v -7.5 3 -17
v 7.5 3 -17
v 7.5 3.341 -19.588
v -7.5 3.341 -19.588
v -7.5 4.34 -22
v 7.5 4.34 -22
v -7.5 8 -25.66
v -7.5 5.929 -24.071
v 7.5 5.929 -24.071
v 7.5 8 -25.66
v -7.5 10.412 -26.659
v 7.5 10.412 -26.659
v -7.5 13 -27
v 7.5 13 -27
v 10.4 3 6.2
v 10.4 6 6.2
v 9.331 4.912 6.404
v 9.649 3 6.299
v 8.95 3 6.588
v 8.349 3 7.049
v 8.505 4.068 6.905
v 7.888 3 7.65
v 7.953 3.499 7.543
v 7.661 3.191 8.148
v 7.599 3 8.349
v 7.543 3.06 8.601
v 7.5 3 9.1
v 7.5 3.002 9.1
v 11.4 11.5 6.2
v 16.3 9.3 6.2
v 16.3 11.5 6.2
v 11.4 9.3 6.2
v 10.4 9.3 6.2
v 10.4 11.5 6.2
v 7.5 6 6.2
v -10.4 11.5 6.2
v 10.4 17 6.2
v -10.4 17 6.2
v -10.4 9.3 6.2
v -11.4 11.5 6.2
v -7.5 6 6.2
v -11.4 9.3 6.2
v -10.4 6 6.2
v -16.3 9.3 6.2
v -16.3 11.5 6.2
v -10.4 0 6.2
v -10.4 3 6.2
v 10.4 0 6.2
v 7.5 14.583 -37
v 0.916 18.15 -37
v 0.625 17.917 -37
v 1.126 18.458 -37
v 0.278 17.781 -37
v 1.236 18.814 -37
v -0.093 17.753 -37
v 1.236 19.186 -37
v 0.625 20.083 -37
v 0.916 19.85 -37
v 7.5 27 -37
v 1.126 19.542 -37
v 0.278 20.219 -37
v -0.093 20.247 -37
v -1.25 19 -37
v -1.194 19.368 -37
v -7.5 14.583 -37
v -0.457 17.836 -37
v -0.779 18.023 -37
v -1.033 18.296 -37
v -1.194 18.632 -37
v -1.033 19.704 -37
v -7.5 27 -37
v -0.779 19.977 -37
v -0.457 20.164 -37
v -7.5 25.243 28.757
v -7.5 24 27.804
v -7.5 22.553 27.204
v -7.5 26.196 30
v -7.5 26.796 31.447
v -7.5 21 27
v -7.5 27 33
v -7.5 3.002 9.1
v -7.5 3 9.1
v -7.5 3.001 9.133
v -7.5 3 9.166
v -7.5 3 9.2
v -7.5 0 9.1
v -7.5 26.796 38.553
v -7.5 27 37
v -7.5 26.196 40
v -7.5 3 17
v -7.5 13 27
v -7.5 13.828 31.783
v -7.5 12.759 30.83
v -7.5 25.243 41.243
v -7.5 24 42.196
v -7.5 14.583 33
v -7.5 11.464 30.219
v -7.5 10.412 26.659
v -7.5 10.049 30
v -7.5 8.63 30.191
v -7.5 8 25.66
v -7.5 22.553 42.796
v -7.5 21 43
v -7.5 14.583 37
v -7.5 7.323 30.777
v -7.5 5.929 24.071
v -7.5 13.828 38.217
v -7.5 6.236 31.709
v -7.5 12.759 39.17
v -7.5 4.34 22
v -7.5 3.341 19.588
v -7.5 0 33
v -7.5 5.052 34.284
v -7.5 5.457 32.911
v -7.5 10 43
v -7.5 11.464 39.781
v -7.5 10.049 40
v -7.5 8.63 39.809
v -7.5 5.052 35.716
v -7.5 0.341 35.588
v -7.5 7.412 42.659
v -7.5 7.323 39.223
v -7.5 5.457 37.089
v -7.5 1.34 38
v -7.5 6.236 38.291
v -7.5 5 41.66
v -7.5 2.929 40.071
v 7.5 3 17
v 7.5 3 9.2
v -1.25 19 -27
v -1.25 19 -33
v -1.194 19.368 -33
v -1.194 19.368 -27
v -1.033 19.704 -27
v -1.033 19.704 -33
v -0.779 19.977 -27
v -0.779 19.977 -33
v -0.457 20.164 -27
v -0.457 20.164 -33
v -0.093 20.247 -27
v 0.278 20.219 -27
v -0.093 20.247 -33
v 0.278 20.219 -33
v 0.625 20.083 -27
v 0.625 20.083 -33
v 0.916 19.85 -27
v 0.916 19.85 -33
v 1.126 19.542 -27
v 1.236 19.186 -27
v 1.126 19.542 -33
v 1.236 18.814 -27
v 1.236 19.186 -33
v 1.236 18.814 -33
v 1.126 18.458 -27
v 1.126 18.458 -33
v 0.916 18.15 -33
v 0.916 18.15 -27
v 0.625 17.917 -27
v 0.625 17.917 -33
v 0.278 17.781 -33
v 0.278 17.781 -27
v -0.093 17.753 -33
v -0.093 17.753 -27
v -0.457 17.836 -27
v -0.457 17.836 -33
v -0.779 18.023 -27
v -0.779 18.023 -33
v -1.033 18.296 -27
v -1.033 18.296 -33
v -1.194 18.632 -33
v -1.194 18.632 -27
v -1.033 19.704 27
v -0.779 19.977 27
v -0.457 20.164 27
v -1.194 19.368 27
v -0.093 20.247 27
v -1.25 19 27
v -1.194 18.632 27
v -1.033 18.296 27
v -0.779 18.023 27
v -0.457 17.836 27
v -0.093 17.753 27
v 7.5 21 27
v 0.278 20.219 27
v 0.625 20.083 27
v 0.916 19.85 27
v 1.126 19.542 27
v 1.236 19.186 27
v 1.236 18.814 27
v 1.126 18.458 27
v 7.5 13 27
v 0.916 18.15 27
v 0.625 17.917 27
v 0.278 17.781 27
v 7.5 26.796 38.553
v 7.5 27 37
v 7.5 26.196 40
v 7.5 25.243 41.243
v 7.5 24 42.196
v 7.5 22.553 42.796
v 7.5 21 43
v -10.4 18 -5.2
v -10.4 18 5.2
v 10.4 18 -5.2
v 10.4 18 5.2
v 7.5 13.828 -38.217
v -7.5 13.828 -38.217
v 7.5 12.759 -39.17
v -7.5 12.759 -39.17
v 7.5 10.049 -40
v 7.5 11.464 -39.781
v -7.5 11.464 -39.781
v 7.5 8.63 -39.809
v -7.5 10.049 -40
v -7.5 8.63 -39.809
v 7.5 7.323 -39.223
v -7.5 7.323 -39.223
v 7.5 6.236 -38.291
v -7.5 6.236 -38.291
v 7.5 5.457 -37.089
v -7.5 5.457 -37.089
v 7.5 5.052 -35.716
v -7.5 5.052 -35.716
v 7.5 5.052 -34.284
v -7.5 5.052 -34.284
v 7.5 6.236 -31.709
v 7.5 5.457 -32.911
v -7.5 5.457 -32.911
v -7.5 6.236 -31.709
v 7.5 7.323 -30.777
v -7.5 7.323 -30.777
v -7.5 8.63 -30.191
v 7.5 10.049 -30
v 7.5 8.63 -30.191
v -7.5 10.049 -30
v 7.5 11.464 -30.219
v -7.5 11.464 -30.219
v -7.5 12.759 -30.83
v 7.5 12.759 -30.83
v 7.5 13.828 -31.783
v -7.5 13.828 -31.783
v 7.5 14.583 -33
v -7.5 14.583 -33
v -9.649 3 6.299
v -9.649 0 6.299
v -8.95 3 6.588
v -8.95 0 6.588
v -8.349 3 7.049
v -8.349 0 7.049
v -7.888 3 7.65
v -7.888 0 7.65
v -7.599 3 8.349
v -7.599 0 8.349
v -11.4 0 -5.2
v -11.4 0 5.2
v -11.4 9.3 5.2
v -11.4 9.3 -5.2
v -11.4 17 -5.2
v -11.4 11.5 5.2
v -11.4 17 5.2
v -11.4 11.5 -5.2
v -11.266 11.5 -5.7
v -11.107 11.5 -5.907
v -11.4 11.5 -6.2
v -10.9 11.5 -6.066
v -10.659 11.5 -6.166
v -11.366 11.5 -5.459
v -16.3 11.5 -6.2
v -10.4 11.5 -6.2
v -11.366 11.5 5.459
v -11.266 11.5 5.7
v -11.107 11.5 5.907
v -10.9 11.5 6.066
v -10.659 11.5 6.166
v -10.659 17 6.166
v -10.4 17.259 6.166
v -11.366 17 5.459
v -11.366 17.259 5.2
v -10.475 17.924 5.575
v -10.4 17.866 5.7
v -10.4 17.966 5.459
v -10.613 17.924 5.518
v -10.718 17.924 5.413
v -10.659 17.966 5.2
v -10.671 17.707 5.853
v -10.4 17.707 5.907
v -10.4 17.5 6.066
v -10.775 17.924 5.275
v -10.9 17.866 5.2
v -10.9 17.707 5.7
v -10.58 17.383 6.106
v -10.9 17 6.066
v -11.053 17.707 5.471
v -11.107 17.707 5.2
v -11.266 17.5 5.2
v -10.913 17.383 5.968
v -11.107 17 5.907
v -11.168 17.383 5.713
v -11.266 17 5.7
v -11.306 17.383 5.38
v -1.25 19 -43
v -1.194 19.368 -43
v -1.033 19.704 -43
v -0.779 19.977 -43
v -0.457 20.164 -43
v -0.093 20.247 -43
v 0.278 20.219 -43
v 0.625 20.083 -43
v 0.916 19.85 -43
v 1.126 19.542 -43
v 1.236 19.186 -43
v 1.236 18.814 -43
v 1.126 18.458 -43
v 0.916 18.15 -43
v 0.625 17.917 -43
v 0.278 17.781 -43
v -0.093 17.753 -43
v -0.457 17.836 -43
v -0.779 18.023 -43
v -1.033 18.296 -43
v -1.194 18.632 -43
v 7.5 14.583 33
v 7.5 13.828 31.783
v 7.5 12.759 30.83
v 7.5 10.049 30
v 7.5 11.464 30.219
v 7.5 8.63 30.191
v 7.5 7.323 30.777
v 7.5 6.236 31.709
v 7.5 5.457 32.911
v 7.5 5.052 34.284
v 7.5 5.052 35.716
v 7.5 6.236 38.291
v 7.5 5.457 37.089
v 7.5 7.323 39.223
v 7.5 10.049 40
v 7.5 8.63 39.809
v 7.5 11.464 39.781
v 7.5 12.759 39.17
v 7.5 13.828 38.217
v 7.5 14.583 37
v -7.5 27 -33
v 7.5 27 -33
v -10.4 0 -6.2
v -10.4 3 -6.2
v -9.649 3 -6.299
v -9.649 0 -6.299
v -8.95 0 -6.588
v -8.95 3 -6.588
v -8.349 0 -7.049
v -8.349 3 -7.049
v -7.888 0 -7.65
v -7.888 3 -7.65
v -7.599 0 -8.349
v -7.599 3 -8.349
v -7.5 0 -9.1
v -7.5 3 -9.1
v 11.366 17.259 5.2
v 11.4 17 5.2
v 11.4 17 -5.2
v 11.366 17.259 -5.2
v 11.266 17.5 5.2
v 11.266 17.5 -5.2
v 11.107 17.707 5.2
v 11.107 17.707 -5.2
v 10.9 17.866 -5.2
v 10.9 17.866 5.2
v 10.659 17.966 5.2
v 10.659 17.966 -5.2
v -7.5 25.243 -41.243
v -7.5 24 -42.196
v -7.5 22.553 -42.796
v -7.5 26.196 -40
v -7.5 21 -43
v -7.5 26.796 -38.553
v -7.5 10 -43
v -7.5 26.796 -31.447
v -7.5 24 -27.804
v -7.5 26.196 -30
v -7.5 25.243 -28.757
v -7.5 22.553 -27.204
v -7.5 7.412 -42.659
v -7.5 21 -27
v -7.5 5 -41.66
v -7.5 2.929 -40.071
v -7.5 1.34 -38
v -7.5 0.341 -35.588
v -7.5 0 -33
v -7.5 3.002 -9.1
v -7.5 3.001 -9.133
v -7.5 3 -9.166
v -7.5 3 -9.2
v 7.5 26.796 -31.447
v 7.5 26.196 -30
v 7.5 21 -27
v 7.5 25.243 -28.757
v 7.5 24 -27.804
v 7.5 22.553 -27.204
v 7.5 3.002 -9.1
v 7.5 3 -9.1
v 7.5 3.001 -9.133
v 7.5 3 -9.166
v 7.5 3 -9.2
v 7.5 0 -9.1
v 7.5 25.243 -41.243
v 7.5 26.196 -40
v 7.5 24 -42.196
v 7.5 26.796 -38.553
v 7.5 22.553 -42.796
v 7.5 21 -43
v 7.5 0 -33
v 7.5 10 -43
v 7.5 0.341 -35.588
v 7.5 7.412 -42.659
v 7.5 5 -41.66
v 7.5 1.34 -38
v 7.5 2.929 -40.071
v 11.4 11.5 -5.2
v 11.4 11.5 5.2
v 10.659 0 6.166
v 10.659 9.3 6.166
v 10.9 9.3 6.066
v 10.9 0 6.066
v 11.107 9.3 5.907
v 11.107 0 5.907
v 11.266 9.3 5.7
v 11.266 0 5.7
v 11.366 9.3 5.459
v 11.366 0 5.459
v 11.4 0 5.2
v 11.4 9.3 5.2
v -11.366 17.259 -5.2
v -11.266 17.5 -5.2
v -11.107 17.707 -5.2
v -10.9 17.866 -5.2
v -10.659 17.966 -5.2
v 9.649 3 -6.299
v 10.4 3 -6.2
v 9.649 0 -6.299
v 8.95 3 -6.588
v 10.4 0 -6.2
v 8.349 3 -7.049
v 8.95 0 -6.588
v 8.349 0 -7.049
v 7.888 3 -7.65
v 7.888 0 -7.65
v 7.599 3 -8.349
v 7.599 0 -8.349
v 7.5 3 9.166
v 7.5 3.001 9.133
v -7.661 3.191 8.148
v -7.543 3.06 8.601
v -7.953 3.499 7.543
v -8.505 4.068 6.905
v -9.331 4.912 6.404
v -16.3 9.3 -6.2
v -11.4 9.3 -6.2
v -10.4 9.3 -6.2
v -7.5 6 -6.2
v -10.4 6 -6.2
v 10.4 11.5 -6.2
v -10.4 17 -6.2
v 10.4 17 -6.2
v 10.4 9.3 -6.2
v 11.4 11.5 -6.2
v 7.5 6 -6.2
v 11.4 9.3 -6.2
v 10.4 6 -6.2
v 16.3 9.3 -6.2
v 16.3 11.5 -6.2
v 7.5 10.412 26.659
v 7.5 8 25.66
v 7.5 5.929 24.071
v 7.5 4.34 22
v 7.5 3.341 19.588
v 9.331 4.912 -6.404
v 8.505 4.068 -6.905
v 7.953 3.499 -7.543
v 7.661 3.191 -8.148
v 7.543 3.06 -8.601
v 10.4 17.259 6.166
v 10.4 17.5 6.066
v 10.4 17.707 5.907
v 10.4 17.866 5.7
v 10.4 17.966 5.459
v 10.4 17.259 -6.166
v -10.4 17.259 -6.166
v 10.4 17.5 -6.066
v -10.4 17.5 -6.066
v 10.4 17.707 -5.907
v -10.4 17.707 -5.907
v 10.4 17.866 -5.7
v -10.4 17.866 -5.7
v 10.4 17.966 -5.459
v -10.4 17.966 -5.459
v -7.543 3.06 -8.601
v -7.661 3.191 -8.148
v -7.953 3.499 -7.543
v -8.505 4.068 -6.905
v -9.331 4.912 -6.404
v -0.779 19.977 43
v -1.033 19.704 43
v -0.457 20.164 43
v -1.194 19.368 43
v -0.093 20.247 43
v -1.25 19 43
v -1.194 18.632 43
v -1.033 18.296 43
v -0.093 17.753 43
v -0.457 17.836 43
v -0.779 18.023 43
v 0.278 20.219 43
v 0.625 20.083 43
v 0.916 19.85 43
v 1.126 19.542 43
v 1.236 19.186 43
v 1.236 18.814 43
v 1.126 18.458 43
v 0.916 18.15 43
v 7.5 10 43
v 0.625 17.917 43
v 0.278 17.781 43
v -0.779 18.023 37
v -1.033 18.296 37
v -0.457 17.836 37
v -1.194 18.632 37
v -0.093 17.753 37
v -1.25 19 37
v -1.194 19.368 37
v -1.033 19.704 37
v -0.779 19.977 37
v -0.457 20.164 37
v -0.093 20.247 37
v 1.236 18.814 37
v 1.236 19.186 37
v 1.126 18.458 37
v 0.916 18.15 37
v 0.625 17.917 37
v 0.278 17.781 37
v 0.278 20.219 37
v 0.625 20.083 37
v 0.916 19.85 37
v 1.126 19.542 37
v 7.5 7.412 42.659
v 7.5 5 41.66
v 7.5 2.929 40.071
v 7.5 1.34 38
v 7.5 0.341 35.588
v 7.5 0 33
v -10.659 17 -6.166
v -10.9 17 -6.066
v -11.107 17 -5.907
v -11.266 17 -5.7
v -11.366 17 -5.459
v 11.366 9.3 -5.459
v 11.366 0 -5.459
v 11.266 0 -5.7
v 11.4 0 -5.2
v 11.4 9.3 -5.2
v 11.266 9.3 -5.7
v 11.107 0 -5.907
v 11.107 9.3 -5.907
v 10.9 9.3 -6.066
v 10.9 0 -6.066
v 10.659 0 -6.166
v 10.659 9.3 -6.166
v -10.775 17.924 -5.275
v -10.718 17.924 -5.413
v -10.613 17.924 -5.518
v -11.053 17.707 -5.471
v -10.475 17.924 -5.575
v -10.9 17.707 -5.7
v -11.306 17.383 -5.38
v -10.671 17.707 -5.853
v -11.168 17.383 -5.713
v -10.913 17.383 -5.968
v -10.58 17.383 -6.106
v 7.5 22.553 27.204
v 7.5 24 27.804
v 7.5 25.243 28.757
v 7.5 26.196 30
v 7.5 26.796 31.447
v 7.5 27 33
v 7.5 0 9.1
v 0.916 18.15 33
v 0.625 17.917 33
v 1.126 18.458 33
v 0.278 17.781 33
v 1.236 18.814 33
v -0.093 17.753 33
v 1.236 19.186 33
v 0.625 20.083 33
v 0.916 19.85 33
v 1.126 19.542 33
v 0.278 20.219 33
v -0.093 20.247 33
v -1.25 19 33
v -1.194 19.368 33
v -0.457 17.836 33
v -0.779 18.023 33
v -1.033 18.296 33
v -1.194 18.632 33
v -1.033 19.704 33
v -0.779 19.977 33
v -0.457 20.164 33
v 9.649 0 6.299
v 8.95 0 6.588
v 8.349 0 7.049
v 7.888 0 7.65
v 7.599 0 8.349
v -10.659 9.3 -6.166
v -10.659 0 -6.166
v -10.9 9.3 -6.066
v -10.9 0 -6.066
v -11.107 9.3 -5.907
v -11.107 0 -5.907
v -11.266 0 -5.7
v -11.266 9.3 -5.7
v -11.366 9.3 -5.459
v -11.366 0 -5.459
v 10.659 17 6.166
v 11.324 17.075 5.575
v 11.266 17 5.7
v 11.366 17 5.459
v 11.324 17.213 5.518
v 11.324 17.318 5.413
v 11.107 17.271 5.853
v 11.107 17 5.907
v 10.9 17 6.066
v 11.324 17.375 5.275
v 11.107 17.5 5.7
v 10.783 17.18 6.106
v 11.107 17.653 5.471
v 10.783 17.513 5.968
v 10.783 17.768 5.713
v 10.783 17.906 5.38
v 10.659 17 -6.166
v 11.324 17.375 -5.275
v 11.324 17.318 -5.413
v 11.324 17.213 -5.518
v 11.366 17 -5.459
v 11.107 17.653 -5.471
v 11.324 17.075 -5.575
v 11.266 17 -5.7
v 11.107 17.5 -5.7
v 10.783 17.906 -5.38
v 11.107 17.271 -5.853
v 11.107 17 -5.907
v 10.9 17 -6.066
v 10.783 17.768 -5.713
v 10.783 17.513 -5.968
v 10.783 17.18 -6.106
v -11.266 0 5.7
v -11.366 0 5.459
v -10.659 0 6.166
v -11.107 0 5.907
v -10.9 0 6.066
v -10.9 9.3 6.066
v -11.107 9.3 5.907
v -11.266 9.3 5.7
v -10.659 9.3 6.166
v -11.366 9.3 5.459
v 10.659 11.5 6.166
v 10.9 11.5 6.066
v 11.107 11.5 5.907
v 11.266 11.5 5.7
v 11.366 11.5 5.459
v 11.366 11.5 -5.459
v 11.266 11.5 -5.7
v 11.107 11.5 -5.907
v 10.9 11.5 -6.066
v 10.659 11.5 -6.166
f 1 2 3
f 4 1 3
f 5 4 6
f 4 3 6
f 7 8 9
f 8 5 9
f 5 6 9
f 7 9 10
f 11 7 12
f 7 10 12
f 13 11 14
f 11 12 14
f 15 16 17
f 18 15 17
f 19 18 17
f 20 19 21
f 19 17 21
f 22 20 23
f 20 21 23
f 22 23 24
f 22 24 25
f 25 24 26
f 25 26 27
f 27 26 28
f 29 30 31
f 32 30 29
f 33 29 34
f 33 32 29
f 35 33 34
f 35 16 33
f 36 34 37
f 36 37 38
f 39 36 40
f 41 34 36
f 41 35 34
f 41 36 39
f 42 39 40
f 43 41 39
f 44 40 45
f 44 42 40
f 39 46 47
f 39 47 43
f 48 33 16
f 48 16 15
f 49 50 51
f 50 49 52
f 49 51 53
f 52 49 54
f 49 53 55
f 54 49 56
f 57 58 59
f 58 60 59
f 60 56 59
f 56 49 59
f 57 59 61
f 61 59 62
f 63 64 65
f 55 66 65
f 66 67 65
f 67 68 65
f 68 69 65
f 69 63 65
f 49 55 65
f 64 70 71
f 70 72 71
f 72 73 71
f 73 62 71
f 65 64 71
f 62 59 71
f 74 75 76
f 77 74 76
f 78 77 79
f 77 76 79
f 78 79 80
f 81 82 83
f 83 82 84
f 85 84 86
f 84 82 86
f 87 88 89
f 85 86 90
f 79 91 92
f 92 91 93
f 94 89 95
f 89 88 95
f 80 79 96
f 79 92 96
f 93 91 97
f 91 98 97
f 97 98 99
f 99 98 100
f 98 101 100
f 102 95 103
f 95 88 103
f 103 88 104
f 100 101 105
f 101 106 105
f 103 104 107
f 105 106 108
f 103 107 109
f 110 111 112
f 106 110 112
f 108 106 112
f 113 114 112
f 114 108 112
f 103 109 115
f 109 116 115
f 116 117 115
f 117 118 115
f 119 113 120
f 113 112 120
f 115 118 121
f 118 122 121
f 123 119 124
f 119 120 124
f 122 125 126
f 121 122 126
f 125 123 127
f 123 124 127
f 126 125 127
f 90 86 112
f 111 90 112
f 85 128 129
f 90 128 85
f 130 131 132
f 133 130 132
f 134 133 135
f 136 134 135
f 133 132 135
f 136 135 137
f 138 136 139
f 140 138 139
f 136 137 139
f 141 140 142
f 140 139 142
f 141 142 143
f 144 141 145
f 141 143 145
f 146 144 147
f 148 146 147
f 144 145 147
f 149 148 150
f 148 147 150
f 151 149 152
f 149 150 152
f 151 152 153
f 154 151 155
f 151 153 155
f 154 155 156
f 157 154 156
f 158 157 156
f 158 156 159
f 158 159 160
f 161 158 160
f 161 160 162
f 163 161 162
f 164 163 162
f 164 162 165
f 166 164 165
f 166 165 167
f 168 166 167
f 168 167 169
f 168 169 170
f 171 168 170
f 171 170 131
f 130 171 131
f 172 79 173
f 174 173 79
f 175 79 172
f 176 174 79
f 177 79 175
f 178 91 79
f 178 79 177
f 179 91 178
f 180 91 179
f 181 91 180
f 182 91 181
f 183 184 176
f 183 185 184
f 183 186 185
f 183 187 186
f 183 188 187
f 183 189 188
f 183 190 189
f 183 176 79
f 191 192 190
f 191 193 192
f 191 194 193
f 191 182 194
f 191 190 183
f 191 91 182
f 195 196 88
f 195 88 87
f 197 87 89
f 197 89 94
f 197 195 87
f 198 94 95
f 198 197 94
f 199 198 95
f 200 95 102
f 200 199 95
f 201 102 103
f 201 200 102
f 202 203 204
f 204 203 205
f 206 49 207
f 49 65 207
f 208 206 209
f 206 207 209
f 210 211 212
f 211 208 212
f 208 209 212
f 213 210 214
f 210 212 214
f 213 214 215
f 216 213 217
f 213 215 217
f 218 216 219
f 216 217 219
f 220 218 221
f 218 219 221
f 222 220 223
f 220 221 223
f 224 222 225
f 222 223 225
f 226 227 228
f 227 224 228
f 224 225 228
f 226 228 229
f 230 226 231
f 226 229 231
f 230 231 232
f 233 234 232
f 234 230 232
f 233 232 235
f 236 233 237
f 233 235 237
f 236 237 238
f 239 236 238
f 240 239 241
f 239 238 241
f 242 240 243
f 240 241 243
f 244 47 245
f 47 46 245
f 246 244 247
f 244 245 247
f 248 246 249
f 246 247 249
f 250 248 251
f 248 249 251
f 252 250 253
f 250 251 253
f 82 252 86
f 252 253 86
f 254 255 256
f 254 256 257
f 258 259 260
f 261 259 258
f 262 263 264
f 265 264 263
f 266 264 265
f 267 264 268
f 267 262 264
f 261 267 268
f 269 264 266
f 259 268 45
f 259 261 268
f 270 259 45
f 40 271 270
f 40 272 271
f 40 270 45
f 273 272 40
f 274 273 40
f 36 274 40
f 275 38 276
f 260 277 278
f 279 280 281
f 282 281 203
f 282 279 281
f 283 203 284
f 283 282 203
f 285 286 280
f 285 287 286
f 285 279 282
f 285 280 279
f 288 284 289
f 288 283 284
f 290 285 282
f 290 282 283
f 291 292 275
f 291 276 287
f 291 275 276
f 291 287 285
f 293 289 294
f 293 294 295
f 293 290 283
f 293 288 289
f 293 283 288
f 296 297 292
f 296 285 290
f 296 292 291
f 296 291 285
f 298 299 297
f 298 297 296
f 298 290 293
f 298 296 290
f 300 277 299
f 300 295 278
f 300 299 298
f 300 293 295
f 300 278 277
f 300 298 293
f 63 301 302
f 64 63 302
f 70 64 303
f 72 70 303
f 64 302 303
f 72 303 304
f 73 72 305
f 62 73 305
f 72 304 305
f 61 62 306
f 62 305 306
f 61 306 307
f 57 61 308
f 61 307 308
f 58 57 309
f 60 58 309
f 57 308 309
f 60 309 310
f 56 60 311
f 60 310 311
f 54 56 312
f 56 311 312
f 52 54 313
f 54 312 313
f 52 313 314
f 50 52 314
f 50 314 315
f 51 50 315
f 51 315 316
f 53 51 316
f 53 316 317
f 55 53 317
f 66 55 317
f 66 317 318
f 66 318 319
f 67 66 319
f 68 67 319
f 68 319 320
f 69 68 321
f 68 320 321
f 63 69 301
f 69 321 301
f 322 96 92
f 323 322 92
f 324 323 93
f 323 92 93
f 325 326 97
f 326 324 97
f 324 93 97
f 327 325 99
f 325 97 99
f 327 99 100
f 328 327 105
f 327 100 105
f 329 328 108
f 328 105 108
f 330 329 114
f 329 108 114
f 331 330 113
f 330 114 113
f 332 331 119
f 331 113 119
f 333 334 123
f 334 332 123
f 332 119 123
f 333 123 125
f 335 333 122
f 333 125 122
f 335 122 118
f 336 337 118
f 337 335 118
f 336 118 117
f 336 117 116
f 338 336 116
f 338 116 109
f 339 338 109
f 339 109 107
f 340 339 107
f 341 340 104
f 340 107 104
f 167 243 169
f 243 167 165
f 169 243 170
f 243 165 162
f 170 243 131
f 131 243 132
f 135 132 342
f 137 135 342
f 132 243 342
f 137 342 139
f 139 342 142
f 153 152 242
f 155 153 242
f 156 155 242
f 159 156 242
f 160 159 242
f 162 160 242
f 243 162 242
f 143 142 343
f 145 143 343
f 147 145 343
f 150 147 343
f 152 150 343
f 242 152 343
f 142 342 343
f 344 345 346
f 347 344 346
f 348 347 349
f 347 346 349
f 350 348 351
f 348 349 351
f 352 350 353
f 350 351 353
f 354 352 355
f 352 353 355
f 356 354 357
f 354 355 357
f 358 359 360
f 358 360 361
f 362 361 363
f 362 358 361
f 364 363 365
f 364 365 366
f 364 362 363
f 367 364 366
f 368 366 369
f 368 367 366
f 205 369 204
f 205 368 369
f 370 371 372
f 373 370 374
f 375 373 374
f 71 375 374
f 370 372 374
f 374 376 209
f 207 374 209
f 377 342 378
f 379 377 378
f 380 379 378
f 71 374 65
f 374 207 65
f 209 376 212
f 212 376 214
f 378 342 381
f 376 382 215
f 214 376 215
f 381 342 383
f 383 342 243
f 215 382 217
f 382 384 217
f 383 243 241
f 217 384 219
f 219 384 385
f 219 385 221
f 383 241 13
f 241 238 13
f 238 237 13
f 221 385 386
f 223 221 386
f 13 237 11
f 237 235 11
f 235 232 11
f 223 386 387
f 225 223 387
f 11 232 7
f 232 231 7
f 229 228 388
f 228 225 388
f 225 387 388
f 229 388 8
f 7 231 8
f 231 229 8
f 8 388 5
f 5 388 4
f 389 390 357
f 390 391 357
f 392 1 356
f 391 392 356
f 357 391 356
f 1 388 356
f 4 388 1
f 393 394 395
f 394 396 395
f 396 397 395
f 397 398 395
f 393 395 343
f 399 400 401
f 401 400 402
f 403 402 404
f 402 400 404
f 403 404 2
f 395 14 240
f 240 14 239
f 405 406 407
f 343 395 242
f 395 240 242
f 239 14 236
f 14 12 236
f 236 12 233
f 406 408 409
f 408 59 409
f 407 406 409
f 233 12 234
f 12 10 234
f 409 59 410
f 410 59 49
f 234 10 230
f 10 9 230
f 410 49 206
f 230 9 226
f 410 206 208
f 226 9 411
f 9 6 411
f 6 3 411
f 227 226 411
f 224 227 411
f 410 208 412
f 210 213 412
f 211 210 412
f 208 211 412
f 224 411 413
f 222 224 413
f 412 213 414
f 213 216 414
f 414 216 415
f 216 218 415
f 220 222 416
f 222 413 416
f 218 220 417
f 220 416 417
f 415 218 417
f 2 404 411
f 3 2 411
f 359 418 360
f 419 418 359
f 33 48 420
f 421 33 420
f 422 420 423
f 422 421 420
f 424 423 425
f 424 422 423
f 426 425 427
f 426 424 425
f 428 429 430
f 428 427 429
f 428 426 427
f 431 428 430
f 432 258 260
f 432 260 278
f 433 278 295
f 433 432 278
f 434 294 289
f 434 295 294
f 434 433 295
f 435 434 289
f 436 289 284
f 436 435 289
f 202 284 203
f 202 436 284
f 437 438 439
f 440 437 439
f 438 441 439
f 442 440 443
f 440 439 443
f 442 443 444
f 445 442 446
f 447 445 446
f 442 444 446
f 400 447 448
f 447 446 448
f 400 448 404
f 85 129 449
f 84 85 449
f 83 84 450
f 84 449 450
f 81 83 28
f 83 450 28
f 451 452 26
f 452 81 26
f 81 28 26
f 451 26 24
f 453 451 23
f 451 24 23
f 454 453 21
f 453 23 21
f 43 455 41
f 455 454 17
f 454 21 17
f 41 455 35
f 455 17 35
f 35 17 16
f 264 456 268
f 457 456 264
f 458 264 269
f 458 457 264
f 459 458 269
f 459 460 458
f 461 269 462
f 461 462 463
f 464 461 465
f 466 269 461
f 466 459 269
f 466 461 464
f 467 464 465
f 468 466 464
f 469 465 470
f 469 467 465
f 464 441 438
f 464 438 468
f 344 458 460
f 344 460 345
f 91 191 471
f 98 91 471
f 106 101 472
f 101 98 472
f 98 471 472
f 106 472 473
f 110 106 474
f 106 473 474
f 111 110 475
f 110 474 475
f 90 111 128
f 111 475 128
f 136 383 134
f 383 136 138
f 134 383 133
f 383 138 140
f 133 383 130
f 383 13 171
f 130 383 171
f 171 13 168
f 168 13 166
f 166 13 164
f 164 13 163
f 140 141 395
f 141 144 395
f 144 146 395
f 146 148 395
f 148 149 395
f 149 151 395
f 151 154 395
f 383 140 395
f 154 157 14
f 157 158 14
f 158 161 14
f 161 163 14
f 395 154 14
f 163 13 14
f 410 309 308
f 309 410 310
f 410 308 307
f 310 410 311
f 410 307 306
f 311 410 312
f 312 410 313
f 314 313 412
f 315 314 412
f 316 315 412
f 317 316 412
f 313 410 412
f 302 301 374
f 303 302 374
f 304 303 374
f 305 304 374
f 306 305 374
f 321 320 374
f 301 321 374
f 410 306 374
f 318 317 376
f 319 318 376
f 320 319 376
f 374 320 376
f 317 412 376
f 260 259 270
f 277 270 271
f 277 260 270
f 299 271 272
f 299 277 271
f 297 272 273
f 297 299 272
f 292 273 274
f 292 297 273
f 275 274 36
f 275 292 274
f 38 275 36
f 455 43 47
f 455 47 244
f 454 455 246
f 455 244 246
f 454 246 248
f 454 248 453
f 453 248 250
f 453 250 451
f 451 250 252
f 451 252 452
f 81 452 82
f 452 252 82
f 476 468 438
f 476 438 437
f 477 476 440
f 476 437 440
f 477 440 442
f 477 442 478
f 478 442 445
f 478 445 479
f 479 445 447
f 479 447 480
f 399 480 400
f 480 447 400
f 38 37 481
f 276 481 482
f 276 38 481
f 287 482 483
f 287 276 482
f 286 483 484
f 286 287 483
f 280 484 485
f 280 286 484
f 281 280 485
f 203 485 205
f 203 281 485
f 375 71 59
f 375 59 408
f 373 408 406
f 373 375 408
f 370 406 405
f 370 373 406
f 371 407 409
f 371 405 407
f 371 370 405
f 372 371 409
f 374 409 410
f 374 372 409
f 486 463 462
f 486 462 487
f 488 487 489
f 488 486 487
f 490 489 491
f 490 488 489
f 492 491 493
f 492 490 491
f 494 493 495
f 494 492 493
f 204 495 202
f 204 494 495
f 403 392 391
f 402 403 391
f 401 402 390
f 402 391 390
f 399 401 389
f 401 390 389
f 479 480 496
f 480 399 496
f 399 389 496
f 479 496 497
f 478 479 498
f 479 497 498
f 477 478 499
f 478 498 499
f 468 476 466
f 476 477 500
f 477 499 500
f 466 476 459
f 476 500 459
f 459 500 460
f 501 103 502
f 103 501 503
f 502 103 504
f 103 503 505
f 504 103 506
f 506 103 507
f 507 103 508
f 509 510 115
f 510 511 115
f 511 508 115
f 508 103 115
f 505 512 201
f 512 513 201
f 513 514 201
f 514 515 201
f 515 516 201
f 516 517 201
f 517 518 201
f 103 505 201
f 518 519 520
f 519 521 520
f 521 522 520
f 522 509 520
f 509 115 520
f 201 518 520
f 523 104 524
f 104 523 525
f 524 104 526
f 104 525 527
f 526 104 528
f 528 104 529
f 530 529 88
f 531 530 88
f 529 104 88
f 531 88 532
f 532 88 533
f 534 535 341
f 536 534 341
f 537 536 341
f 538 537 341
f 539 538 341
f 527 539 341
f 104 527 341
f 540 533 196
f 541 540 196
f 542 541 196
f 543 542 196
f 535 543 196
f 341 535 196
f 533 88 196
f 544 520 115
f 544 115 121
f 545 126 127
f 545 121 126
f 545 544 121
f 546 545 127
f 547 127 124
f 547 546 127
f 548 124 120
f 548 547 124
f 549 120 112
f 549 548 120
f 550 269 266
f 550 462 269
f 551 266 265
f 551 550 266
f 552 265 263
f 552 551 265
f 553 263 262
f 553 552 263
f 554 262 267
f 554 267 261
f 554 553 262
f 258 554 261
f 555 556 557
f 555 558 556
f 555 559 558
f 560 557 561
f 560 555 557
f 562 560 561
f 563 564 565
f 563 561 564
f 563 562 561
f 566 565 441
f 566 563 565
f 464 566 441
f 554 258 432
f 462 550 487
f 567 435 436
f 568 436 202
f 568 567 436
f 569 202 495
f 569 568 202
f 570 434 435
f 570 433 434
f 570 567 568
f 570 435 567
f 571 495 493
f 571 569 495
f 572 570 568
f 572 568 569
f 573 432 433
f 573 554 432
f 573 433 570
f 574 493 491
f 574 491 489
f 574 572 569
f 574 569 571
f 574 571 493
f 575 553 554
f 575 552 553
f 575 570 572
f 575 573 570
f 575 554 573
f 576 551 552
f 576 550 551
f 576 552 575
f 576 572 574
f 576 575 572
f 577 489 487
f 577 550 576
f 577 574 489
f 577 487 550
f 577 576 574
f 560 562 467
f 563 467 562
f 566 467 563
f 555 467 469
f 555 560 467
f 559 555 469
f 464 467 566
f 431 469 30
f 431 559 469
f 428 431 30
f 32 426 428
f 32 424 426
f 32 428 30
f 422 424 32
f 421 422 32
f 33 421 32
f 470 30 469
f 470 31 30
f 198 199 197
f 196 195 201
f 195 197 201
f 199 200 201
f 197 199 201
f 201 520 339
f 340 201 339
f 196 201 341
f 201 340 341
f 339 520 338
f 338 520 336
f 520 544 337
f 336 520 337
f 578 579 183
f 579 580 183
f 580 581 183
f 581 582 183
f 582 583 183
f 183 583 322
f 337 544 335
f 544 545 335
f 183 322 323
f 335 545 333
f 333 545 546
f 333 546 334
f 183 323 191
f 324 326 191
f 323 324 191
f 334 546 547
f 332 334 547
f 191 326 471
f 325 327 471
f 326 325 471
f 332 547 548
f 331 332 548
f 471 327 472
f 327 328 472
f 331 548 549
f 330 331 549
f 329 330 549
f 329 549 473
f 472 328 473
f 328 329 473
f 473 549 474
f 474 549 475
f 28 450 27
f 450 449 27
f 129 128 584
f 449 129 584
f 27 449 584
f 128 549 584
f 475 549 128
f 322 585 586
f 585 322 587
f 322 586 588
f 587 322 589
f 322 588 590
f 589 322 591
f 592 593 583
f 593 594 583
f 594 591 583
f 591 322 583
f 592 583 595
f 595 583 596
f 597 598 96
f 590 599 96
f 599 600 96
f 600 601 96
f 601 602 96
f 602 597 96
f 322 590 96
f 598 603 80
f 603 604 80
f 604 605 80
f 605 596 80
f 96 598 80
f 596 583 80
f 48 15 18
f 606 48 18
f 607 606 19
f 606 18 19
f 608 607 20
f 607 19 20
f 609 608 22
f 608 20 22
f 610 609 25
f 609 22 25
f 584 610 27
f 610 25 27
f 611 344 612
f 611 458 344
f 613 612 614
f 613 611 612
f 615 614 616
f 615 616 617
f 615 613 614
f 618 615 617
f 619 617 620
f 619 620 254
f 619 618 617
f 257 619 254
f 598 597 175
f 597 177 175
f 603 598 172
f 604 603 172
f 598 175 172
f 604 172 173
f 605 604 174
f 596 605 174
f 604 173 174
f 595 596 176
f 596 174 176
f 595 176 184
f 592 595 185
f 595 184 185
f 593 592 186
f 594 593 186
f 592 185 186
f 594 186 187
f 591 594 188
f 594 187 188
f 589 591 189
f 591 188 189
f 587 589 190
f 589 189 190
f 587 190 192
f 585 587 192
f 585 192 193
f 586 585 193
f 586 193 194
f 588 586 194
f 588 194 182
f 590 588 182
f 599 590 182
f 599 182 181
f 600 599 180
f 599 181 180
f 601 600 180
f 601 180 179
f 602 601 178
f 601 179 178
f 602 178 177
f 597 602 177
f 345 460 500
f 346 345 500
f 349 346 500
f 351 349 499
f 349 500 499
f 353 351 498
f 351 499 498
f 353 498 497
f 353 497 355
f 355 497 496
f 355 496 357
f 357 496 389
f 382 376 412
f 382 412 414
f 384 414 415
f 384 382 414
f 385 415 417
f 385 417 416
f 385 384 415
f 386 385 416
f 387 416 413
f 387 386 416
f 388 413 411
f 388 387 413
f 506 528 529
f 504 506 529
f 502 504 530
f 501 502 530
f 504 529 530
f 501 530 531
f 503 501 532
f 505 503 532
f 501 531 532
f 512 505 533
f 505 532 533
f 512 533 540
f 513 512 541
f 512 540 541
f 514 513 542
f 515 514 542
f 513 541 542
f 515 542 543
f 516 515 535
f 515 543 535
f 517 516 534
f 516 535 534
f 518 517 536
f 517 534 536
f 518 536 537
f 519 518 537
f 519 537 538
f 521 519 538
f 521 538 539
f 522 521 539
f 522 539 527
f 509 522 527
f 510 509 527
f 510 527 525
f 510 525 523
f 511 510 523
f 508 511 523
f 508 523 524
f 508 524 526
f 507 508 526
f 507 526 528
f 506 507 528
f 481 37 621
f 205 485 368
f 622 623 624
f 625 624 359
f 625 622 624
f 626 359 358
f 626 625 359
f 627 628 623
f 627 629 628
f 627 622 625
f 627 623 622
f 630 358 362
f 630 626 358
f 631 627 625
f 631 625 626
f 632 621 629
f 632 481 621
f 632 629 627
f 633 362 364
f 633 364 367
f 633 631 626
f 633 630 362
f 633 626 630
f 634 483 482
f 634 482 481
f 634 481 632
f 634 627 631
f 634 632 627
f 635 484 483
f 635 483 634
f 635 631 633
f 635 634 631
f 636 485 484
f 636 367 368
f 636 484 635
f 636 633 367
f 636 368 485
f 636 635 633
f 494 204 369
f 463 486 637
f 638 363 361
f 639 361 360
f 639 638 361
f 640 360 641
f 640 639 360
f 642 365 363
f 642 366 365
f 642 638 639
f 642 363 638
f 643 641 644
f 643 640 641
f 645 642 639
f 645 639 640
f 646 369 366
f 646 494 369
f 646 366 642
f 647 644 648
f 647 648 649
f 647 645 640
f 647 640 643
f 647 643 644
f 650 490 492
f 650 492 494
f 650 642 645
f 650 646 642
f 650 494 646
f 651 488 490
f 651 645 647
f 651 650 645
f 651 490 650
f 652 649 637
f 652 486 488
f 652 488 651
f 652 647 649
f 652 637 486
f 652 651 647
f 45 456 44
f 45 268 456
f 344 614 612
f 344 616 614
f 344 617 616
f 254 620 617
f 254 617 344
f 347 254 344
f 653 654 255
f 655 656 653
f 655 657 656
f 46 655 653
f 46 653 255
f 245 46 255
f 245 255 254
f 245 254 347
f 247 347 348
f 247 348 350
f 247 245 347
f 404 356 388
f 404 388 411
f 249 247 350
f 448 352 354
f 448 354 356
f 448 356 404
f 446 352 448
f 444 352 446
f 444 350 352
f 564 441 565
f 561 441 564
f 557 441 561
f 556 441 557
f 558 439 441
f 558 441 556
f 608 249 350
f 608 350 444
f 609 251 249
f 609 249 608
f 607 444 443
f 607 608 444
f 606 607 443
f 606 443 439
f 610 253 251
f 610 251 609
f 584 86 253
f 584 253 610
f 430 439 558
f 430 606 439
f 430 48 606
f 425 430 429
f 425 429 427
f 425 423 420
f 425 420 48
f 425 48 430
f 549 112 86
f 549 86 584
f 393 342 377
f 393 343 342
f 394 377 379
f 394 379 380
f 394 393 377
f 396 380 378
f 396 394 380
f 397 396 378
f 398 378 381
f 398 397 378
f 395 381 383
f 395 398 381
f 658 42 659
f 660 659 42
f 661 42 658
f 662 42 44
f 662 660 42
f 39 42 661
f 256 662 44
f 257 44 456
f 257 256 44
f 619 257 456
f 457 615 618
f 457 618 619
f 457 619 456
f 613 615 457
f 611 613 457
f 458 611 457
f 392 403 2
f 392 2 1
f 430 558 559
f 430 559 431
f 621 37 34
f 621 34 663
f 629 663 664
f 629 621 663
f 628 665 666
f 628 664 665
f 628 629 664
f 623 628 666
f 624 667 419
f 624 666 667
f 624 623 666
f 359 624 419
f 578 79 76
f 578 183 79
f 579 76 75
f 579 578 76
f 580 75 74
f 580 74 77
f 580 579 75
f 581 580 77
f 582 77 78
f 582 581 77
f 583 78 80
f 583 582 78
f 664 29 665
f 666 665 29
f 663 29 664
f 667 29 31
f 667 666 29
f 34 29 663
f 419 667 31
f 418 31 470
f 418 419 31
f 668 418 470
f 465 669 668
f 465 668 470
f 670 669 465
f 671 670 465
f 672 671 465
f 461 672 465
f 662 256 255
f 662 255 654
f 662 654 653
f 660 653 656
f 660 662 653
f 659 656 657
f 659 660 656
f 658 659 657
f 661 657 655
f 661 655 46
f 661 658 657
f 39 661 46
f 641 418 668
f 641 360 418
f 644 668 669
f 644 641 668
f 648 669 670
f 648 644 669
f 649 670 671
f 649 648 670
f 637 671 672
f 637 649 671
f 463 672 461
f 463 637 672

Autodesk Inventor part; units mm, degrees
ref_plane "YZ Plane" through (0, 0, 0) normal (1, 0, 0) x (0, 1, 0)
ref_plane "XZ Plane" through (0, 0, 0) normal (0, 1, 0) x (-1, 0, 0)
ref_plane "XY Plane" through (0, 0, 0) normal (0, 0, 1) x (1, 0, 0)
sketch "Schizzo1" plane through (0, 0, 0) normal (0, 1, 0) x (-1, 0, 0)
  line L0 (7.5, 43) -> (-7.5, 43)
  line L1 (-7.5, 43) -> (-7.5, -43)
  line L2 (-7.5, -43) -> (7.5, -43)
  line L3 (7.5, -43) -> (7.5, 43)
  line L4 (7.5, 43) -> (-7.5, -43) construction
  line L5 (-7.5, 43) -> (7.5, -43) construction
  point P0 (0, 0)
  dimension "d0" = 15
  dimension "d1" = 86
extrude "Estrusione1" add sketch "Schizzo1" along normal blind 3
sketch "Schizzo2" plane through (0, 3, 0) normal (0, 1, 0) x (1, 0, 0)
  line L0 (7.5, 43) -> (-7.5, 43)
  line L1 (-7.5, 43) -> (-7.5, 27)
  line L2 (-7.5, 27) -> (7.5, 27)
  line L3 (7.5, 27) -> (7.5, 43)
  line L4 (-7.5, 43) -> (-7.5, -43) projected
  line L5 (7.5, 43) -> (-7.5, 43) projected
  line L6 (-7.5, -43) -> (7.5, -43) projected
  line L7 (7.5, -43) -> (-7.5, -43)
  line L8 (-7.5, -43) -> (-7.5, -27)
  line L9 (-7.5, -27) -> (7.5, -27)
  line L10 (7.5, -27) -> (7.5, -43)
  point P0 (0, 0)
  dimension "d4" = 15
  dimension "d5" = 16
  dimension "d6" = 0
  dimension "d7" = 0
  dimension "d8" = 16
extrude "Estrusione2" add sketch "Schizzo2" along normal blind 24
sketch "Schizzo3" plane through (-7.5, 0, -43) normal (-1, 0, 0) x (0, 0, 1)
  line L0 (0, 0) -> (86, 0) projected
  line L1 (0, 0) -> (0, 27) projected
  line L2 (86, 0) -> (86, 27) projected
  circle A0 centre (8, 10) radius 5
  circle A1 centre (78, 10) radius 5
  point P0 (43, 0)
  dimension "d11" = 10
  dimension "d12" = 8
  dimension "d13" = 10
  dimension "d14" = 8
  dimension "d15" = 10
  dimension "d16" = 10
extrude "Estrusione3" cut sketch "Schizzo3" against normal blind 30
fillet "Raccordo1" radius 10 2 edges at (0, 3, -27) (0, 3, 27)
fillet "Raccordo2" radius 10 2 edges at (0, 0, -43) (0, 0, 43)
sketch "Schizzo4" plane through (0, 27, 0) normal (0, 1, 0) x (1, 0, 0)
  line L0 (7.5, 37) -> (-7.5, 37)
  line L1 (-7.5, 37) -> (-7.5, 33)
  line L2 (-7.5, 33) -> (7.5, 33)
  line L3 (7.5, 33) -> (7.5, 37)
  line L4 (7.5, 27) -> (7.5, 43) projected
  line L5 (7.5, 43) -> (-7.5, 43) projected
  line L6 (7.5, -33) -> (-7.5, -33)
  line L7 (-7.5, -33) -> (-7.5, -37)
  line L8 (-7.5, -37) -> (7.5, -37)
  line L9 (7.5, -37) -> (7.5, -33)
  line L10 (7.5, -43) -> (7.5, -27) projected
  line L11 (-7.5, -43) -> (7.5, -43) projected
  point P0 (0, 0)
  dimension "d21" = 15
  dimension "d22" = 4
  dimension "d23" = 0
  dimension "d24" = 6
  dimension "d25" = 15
  dimension "d26" = 4
  dimension "d27" = 0
  dimension "d28" = 6
extrude "Estrusione4" cut sketch "Schizzo4" against normal blind 15
sketch "Schizzo5" plane through (7.5, 27, -43) normal (0, 0, -1) x (-1, 0, 0)
  line L0 (0, 0) -> (15, 0) projected
  line L1 (15, -17) -> (15, 0) projected
  circle A0 centre (7.5, -8) radius 1.25
  point P0 (7.5, -27)
  dimension "d31" = 8
  dimension "d32" = 7.5
  dimension "d33" = 2.5
extrude "Estrusione5" cut sketch "Schizzo5" against normal blind 86
fillet "Raccordo3" radius 6 4 edges at (0, 27, 43) (0, 27, 27) (0, 27, -27) (0, 27, -43)
sketch "Schizzo6" plane through (0, 0, 0) normal (0, -1, 0) x (1, 0, 0)
  line L0 (-11.4, -6.2) -> (11.4, -6.2)
  line L1 (11.4, -6.2) -> (11.4, 6.2)
  line L2 (11.4, 6.2) -> (-11.4, 6.2)
  line L3 (-11.4, 6.2) -> (-11.4, -6.2)
  line L4 (-11.4, -6.2) -> (11.4, 6.2) construction
  line L5 (11.4, -6.2) -> (-11.4, 6.2) construction
  point P0 (0, 0)
  dimension "d37" = 22.8
  dimension "d38" = 12.4
extrude "Estrusione6" add sketch "Schizzo6" against normal blind 18
sketch "Schizzo7" plane through (11.4, 0, 6.2) normal (1, 0, 0) x (0, 0, -1)
  line L0 (0, 11.5) -> (12.4, 11.5)
  line L1 (12.4, 11.5) -> (12.4, 9.3)
  line L2 (12.4, 9.3) -> (0, 9.3)
  line L3 (0, 9.3) -> (0, 11.5)
  line L4 (0, 11.5) -> (12.4, 9.3) construction
  line L5 (12.4, 11.5) -> (0, 9.3) construction
  line L6 (12.4, 0) -> (0, 0) projected
  line L7 (12.4, 0) -> (12.4, 18) projected
  point P0 (6.2, 0)
  point P1 (6.2, 10.4)
  dimension "d41" = 12.4
  dimension "d42" = 2.2
  dimension "d43" = 9.3
  dimension "d44" = 0
extrude "Estrusione7" add sketch "Schizzo7" along normal blind 4.9
sketch "Schizzo8" plane through (-11.4, 0, -6.2) normal (-1, 0, 0) x (0, 0, 1)
  line L0 (0, 11.5) -> (12.4, 11.5)
  line L1 (12.4, 11.5) -> (12.4, 9.3)
  line L2 (12.4, 9.3) -> (0, 9.3)
  line L3 (0, 9.3) -> (0, 11.5)
  line L4 (0, 11.5) -> (12.4, 9.3) construction
  line L5 (12.4, 11.5) -> (0, 9.3) construction
  line L6 (12.4, 0) -> (0, 0) projected
  line L7 (12.4, 0) -> (12.4, 18) projected
  point P0 (6.2, 0)
  point P1 (6.2, 10.4)
  dimension "d47" = 12.4
  dimension "d48" = 2.2
  dimension "d49" = 9.3
  dimension "d50" = 0
extrude "Estrusione8" add sketch "Schizzo8" along normal blind 4.9
fillet "Raccordo4" radius 3 2 edges at (0, 3, 6.2) (0, 3, -6.2)
fillet "Raccordo5" radius 1 12 edges at (-11.4, 4.65, 6.2) (-11.4, 14.75, 6.2) (-11.4, 14.75, -6.2) (-11.4, 4.65, -6.2) (-11.4, 18, 0) (0, 18, -6.2) (0, 18, 6.2) (11.4, 4.65, -6.2) (11.4, 14.75, -6.2) (11.4, 18, 0) (11.4, 14.75, 6.2) (11.4, 4.65, 6.2)
fillet "Raccordo6" radius 2.9 8 edges at (-7.5, 4.5, -6.2) (-7.5, 1.5, -6.2) (-7.5, 1.5, 6.2) (-7.5, 4.5, 6.2) (7.5, 4.5, 6.2) (7.5, 1.5, 6.2) (7.5, 1.5, -6.2) (7.5, 4.5, -6.2)
properties part number "SupportGimbalAdafruit"
